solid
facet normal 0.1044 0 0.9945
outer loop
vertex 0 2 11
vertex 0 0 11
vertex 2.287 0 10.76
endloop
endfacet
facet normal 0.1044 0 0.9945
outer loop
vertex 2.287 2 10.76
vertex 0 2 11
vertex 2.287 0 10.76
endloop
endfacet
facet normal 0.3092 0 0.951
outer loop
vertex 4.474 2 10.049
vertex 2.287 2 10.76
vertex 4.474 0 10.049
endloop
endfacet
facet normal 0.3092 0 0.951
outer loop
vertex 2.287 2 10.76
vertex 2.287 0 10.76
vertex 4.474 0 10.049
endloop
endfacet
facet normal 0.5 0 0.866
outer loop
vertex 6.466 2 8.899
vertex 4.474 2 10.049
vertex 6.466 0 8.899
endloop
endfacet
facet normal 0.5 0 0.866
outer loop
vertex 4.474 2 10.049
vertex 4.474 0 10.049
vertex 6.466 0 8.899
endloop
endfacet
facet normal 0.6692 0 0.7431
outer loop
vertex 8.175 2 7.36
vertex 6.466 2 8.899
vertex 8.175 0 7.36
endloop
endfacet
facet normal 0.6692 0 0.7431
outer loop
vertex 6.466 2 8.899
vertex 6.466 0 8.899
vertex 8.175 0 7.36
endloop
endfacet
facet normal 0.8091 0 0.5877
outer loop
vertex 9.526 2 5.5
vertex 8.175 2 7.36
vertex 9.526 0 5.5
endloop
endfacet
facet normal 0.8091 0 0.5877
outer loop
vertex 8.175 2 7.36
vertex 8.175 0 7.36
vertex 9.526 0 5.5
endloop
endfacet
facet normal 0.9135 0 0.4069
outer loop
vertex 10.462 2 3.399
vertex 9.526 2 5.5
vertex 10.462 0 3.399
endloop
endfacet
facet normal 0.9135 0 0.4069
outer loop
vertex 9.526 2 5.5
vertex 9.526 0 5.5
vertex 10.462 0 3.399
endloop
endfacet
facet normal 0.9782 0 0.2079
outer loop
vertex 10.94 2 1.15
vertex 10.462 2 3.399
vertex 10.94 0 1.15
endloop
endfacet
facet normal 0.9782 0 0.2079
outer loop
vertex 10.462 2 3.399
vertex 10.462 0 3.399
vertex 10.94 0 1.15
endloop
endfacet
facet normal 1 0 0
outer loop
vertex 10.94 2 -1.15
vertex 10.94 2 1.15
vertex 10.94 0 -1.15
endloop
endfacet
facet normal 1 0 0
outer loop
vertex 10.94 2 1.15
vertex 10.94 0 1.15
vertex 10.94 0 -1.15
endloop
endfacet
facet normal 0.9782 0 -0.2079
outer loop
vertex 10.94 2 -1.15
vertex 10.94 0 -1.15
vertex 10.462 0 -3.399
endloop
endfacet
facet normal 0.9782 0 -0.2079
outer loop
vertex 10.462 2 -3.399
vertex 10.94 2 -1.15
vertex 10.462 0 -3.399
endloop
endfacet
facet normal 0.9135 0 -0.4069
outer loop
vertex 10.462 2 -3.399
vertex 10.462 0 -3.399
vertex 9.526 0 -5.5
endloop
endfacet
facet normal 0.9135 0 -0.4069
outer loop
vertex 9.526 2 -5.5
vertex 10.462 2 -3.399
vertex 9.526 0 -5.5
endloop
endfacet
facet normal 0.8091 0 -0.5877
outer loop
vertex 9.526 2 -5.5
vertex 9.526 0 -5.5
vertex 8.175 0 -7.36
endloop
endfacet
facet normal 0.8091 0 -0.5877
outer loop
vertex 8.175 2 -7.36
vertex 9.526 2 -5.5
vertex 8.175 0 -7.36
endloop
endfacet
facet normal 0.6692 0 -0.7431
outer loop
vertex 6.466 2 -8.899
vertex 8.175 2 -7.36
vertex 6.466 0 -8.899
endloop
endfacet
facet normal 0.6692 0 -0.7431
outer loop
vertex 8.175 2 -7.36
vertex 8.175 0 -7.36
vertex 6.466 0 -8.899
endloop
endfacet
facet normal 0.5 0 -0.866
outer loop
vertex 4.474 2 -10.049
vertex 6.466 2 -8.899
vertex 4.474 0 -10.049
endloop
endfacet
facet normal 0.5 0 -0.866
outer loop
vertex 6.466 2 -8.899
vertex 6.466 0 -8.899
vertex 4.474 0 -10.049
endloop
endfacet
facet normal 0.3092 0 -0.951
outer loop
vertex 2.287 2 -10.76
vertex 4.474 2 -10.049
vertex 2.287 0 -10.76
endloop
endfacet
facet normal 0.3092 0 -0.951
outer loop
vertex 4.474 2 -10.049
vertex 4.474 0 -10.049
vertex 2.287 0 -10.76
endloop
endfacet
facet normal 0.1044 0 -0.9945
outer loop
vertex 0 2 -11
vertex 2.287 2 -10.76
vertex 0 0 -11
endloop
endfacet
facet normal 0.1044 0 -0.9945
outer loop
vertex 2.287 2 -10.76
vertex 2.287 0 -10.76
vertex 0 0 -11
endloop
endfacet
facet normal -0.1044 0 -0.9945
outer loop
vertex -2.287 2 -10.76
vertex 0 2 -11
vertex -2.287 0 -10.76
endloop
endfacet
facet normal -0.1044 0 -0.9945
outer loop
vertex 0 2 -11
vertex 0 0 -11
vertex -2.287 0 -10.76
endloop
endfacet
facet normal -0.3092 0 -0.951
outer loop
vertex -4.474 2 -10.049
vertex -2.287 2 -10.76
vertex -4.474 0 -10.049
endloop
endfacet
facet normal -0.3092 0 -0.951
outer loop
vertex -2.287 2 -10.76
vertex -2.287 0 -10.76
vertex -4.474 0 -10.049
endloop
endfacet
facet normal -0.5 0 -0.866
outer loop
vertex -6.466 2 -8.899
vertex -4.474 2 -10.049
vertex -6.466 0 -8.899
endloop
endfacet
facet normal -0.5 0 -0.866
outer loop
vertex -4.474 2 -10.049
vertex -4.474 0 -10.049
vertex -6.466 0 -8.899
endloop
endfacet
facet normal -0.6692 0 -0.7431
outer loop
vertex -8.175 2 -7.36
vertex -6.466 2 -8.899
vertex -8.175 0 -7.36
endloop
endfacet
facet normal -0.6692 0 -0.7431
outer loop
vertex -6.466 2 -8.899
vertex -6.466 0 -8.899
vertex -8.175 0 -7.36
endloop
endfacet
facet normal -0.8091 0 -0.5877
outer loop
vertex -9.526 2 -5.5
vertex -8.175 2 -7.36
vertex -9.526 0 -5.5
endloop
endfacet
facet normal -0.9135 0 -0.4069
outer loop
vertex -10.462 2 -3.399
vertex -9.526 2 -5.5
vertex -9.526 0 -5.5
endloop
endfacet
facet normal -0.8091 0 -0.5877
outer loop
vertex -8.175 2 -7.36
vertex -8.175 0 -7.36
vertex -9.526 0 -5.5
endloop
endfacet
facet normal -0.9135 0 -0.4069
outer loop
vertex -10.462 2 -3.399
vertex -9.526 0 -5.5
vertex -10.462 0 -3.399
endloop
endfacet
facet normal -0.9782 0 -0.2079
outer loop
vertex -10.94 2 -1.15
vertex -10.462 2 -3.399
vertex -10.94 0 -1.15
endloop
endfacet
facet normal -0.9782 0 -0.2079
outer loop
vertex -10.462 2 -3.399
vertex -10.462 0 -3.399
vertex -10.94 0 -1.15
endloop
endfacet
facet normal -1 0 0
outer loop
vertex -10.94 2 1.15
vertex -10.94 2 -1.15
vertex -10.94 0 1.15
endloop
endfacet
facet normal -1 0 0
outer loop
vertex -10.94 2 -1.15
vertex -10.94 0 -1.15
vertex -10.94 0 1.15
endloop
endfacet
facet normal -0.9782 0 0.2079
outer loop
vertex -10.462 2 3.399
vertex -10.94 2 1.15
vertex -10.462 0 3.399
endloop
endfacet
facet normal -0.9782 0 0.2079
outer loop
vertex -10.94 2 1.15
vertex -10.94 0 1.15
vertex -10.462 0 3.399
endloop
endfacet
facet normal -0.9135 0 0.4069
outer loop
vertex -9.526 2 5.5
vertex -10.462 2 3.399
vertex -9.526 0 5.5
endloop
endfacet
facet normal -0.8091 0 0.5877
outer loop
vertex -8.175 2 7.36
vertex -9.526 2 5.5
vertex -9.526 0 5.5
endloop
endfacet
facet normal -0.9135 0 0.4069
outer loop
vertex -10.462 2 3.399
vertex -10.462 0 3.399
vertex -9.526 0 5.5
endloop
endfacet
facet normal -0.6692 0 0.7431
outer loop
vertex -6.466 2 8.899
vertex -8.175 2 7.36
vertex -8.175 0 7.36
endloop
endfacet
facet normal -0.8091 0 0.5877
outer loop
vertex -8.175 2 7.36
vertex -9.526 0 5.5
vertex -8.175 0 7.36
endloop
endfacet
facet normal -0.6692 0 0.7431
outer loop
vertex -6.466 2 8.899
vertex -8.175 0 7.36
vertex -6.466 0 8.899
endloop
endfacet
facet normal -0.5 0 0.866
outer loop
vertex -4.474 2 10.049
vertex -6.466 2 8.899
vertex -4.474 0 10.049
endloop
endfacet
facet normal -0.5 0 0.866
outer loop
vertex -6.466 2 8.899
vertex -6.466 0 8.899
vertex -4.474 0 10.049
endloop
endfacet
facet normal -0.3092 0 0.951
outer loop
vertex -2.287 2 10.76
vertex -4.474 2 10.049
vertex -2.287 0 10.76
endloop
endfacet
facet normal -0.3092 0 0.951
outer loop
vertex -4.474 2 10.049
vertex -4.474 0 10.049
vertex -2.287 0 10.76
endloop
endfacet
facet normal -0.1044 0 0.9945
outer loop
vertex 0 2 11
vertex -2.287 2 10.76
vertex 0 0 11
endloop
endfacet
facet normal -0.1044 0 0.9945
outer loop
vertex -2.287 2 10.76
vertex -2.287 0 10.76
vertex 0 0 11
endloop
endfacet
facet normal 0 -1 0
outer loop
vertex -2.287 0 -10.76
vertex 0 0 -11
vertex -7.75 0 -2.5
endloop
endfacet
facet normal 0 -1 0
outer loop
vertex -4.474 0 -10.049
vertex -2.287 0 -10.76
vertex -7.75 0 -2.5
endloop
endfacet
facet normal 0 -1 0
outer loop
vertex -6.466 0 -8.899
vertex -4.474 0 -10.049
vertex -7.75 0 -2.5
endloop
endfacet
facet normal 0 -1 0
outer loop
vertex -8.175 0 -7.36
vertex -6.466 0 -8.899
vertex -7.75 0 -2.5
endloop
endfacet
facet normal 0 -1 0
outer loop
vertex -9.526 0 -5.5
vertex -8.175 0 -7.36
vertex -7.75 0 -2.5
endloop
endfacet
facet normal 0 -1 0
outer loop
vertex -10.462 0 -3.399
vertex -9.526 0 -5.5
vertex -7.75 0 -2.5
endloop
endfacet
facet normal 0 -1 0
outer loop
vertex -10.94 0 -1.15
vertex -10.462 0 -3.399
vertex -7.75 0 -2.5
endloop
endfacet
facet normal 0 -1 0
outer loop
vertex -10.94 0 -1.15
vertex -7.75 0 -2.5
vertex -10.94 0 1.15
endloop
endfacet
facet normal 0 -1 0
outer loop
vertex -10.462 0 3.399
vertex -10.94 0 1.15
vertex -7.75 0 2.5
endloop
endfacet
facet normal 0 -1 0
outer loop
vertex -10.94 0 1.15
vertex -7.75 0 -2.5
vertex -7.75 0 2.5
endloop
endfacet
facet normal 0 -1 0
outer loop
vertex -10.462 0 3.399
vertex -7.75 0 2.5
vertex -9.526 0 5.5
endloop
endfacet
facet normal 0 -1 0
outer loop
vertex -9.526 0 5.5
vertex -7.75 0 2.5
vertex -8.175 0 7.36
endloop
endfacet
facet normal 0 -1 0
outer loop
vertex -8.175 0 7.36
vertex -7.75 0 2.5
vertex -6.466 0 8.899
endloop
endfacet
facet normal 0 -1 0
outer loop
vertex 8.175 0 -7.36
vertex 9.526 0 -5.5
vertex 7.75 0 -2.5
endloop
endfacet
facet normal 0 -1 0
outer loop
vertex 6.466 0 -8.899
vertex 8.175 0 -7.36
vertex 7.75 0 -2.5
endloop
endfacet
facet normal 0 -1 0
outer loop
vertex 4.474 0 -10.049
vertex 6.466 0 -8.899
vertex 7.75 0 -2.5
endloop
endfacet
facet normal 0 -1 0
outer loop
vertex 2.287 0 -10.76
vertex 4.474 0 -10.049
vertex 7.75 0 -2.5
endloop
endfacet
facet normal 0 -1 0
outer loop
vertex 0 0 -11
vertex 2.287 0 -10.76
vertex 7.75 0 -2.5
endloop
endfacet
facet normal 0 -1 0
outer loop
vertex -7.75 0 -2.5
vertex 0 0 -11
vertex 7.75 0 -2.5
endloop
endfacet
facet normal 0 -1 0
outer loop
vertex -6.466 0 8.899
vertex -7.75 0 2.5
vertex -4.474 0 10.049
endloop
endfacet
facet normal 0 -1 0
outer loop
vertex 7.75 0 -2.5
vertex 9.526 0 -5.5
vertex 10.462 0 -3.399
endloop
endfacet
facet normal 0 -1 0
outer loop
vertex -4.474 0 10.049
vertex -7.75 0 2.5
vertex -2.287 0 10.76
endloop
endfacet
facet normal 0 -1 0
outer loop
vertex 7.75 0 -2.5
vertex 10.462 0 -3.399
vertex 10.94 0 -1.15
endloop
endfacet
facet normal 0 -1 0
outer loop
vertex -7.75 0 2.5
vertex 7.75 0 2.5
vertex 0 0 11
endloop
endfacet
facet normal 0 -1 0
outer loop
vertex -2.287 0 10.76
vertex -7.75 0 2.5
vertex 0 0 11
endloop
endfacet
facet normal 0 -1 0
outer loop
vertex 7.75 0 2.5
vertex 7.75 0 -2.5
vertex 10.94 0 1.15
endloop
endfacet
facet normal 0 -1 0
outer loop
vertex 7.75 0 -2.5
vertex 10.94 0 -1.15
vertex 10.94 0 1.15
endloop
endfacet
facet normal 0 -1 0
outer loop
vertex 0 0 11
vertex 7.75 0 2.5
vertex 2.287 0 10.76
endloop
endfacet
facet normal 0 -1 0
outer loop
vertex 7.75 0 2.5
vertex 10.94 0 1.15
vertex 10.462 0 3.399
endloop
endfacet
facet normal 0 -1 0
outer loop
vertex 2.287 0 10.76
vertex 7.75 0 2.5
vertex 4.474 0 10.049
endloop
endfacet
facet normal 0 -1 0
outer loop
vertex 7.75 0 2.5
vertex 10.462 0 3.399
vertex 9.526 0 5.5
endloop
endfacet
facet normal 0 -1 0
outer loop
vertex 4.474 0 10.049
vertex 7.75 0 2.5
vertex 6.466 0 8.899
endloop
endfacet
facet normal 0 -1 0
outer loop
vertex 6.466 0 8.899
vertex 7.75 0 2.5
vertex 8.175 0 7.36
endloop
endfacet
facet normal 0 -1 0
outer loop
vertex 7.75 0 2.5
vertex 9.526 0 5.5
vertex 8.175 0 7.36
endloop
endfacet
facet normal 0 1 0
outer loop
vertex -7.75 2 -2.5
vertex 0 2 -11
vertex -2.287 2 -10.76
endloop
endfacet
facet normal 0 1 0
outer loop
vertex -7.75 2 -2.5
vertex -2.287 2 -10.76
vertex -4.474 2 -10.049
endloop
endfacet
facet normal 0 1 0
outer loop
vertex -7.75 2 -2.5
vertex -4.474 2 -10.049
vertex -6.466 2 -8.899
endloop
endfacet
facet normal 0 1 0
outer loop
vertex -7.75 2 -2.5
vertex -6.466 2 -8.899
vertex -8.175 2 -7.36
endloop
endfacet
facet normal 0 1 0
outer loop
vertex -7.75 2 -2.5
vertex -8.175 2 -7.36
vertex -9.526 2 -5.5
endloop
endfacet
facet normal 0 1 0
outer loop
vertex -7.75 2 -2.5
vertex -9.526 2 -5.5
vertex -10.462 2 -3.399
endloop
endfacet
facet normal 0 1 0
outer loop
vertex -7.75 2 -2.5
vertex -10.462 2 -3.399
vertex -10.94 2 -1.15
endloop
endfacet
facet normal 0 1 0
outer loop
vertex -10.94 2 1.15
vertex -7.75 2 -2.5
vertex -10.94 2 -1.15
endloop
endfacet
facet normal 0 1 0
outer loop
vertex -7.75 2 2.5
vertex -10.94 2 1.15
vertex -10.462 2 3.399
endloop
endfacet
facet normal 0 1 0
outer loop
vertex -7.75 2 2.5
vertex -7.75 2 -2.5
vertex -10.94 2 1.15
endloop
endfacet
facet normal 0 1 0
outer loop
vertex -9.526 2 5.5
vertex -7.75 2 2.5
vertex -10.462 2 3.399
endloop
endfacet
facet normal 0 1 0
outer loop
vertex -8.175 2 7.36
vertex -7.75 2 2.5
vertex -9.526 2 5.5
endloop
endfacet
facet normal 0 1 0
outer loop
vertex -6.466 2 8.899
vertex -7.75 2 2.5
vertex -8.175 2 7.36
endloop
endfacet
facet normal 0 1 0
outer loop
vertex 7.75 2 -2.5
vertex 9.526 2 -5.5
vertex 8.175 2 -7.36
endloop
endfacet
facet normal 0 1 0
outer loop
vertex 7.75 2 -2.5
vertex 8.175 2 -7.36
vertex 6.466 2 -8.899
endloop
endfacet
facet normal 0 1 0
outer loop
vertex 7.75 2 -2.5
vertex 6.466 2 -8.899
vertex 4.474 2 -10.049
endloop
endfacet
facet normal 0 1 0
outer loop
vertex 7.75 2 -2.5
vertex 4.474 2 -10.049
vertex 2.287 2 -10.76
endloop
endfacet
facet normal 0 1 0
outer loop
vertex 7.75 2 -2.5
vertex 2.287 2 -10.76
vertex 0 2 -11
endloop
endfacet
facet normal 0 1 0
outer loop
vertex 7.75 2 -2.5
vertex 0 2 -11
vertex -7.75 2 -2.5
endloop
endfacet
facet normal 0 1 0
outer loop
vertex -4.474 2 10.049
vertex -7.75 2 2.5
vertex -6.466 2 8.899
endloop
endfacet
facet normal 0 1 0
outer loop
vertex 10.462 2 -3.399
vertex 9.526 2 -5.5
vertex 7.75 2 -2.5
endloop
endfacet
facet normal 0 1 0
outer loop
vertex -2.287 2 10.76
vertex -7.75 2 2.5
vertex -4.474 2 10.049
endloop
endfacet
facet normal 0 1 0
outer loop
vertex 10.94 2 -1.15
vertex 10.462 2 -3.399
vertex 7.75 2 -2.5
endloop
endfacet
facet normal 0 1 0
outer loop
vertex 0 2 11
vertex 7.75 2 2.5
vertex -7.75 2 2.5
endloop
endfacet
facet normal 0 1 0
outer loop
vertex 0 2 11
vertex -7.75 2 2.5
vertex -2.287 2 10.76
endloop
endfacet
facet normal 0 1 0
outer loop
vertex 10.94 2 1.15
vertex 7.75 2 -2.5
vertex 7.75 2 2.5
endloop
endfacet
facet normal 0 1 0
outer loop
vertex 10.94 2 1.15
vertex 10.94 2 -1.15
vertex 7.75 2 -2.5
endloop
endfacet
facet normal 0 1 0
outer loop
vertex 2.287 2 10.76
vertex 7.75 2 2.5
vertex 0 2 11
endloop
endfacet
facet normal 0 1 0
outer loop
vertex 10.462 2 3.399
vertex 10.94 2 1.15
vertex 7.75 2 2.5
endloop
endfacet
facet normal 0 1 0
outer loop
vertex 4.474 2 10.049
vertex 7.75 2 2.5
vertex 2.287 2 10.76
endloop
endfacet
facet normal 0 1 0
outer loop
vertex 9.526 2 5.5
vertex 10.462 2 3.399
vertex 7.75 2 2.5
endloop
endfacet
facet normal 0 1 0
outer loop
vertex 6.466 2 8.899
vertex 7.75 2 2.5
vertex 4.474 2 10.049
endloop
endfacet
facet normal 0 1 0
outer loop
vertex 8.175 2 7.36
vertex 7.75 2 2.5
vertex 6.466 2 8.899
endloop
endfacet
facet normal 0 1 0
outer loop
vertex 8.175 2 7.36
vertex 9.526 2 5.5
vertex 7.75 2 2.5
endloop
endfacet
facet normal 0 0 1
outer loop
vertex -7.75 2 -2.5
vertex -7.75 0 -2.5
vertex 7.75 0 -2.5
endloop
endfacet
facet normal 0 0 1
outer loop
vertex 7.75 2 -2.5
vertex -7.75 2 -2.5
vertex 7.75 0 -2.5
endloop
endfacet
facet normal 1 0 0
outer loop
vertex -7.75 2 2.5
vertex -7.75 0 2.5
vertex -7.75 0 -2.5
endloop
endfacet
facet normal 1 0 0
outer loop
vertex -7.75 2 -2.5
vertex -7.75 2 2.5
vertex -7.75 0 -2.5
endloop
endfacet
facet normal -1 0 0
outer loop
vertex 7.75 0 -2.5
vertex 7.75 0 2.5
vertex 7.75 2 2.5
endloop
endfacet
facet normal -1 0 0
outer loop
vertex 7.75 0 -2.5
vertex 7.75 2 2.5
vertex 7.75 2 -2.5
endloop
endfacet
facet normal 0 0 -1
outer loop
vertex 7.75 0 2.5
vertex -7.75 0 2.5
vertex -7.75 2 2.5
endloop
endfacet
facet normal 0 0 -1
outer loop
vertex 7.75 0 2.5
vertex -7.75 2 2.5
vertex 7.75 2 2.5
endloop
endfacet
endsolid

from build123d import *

# Parameters (mm, degrees)
SZKIC1_R                    = 11
SZKIC1_W                    = 15.5
SZKIC1_H                    = 5
DODANIE_WYCI_GNI_CIE1_DEPTH = 2


with BuildPart() as part:
    # Szkic1 → Dodanie-wyciągnięcie1 (new body)
    with BuildSketch(Plane(origin=(0, 0, 0), x_dir=(1, 0, 0), z_dir=(0, 1, 0))):
        with Locations(Location((0, 0, 0), (0, 0, 270))):
            Circle(SZKIC1_R)
        Rectangle(SZKIC1_W, SZKIC1_H, mode=Mode.SUBTRACT)
    extrude(amount=DODANIE_WYCI_GNI_CIE1_DEPTH)


solid = part.part
